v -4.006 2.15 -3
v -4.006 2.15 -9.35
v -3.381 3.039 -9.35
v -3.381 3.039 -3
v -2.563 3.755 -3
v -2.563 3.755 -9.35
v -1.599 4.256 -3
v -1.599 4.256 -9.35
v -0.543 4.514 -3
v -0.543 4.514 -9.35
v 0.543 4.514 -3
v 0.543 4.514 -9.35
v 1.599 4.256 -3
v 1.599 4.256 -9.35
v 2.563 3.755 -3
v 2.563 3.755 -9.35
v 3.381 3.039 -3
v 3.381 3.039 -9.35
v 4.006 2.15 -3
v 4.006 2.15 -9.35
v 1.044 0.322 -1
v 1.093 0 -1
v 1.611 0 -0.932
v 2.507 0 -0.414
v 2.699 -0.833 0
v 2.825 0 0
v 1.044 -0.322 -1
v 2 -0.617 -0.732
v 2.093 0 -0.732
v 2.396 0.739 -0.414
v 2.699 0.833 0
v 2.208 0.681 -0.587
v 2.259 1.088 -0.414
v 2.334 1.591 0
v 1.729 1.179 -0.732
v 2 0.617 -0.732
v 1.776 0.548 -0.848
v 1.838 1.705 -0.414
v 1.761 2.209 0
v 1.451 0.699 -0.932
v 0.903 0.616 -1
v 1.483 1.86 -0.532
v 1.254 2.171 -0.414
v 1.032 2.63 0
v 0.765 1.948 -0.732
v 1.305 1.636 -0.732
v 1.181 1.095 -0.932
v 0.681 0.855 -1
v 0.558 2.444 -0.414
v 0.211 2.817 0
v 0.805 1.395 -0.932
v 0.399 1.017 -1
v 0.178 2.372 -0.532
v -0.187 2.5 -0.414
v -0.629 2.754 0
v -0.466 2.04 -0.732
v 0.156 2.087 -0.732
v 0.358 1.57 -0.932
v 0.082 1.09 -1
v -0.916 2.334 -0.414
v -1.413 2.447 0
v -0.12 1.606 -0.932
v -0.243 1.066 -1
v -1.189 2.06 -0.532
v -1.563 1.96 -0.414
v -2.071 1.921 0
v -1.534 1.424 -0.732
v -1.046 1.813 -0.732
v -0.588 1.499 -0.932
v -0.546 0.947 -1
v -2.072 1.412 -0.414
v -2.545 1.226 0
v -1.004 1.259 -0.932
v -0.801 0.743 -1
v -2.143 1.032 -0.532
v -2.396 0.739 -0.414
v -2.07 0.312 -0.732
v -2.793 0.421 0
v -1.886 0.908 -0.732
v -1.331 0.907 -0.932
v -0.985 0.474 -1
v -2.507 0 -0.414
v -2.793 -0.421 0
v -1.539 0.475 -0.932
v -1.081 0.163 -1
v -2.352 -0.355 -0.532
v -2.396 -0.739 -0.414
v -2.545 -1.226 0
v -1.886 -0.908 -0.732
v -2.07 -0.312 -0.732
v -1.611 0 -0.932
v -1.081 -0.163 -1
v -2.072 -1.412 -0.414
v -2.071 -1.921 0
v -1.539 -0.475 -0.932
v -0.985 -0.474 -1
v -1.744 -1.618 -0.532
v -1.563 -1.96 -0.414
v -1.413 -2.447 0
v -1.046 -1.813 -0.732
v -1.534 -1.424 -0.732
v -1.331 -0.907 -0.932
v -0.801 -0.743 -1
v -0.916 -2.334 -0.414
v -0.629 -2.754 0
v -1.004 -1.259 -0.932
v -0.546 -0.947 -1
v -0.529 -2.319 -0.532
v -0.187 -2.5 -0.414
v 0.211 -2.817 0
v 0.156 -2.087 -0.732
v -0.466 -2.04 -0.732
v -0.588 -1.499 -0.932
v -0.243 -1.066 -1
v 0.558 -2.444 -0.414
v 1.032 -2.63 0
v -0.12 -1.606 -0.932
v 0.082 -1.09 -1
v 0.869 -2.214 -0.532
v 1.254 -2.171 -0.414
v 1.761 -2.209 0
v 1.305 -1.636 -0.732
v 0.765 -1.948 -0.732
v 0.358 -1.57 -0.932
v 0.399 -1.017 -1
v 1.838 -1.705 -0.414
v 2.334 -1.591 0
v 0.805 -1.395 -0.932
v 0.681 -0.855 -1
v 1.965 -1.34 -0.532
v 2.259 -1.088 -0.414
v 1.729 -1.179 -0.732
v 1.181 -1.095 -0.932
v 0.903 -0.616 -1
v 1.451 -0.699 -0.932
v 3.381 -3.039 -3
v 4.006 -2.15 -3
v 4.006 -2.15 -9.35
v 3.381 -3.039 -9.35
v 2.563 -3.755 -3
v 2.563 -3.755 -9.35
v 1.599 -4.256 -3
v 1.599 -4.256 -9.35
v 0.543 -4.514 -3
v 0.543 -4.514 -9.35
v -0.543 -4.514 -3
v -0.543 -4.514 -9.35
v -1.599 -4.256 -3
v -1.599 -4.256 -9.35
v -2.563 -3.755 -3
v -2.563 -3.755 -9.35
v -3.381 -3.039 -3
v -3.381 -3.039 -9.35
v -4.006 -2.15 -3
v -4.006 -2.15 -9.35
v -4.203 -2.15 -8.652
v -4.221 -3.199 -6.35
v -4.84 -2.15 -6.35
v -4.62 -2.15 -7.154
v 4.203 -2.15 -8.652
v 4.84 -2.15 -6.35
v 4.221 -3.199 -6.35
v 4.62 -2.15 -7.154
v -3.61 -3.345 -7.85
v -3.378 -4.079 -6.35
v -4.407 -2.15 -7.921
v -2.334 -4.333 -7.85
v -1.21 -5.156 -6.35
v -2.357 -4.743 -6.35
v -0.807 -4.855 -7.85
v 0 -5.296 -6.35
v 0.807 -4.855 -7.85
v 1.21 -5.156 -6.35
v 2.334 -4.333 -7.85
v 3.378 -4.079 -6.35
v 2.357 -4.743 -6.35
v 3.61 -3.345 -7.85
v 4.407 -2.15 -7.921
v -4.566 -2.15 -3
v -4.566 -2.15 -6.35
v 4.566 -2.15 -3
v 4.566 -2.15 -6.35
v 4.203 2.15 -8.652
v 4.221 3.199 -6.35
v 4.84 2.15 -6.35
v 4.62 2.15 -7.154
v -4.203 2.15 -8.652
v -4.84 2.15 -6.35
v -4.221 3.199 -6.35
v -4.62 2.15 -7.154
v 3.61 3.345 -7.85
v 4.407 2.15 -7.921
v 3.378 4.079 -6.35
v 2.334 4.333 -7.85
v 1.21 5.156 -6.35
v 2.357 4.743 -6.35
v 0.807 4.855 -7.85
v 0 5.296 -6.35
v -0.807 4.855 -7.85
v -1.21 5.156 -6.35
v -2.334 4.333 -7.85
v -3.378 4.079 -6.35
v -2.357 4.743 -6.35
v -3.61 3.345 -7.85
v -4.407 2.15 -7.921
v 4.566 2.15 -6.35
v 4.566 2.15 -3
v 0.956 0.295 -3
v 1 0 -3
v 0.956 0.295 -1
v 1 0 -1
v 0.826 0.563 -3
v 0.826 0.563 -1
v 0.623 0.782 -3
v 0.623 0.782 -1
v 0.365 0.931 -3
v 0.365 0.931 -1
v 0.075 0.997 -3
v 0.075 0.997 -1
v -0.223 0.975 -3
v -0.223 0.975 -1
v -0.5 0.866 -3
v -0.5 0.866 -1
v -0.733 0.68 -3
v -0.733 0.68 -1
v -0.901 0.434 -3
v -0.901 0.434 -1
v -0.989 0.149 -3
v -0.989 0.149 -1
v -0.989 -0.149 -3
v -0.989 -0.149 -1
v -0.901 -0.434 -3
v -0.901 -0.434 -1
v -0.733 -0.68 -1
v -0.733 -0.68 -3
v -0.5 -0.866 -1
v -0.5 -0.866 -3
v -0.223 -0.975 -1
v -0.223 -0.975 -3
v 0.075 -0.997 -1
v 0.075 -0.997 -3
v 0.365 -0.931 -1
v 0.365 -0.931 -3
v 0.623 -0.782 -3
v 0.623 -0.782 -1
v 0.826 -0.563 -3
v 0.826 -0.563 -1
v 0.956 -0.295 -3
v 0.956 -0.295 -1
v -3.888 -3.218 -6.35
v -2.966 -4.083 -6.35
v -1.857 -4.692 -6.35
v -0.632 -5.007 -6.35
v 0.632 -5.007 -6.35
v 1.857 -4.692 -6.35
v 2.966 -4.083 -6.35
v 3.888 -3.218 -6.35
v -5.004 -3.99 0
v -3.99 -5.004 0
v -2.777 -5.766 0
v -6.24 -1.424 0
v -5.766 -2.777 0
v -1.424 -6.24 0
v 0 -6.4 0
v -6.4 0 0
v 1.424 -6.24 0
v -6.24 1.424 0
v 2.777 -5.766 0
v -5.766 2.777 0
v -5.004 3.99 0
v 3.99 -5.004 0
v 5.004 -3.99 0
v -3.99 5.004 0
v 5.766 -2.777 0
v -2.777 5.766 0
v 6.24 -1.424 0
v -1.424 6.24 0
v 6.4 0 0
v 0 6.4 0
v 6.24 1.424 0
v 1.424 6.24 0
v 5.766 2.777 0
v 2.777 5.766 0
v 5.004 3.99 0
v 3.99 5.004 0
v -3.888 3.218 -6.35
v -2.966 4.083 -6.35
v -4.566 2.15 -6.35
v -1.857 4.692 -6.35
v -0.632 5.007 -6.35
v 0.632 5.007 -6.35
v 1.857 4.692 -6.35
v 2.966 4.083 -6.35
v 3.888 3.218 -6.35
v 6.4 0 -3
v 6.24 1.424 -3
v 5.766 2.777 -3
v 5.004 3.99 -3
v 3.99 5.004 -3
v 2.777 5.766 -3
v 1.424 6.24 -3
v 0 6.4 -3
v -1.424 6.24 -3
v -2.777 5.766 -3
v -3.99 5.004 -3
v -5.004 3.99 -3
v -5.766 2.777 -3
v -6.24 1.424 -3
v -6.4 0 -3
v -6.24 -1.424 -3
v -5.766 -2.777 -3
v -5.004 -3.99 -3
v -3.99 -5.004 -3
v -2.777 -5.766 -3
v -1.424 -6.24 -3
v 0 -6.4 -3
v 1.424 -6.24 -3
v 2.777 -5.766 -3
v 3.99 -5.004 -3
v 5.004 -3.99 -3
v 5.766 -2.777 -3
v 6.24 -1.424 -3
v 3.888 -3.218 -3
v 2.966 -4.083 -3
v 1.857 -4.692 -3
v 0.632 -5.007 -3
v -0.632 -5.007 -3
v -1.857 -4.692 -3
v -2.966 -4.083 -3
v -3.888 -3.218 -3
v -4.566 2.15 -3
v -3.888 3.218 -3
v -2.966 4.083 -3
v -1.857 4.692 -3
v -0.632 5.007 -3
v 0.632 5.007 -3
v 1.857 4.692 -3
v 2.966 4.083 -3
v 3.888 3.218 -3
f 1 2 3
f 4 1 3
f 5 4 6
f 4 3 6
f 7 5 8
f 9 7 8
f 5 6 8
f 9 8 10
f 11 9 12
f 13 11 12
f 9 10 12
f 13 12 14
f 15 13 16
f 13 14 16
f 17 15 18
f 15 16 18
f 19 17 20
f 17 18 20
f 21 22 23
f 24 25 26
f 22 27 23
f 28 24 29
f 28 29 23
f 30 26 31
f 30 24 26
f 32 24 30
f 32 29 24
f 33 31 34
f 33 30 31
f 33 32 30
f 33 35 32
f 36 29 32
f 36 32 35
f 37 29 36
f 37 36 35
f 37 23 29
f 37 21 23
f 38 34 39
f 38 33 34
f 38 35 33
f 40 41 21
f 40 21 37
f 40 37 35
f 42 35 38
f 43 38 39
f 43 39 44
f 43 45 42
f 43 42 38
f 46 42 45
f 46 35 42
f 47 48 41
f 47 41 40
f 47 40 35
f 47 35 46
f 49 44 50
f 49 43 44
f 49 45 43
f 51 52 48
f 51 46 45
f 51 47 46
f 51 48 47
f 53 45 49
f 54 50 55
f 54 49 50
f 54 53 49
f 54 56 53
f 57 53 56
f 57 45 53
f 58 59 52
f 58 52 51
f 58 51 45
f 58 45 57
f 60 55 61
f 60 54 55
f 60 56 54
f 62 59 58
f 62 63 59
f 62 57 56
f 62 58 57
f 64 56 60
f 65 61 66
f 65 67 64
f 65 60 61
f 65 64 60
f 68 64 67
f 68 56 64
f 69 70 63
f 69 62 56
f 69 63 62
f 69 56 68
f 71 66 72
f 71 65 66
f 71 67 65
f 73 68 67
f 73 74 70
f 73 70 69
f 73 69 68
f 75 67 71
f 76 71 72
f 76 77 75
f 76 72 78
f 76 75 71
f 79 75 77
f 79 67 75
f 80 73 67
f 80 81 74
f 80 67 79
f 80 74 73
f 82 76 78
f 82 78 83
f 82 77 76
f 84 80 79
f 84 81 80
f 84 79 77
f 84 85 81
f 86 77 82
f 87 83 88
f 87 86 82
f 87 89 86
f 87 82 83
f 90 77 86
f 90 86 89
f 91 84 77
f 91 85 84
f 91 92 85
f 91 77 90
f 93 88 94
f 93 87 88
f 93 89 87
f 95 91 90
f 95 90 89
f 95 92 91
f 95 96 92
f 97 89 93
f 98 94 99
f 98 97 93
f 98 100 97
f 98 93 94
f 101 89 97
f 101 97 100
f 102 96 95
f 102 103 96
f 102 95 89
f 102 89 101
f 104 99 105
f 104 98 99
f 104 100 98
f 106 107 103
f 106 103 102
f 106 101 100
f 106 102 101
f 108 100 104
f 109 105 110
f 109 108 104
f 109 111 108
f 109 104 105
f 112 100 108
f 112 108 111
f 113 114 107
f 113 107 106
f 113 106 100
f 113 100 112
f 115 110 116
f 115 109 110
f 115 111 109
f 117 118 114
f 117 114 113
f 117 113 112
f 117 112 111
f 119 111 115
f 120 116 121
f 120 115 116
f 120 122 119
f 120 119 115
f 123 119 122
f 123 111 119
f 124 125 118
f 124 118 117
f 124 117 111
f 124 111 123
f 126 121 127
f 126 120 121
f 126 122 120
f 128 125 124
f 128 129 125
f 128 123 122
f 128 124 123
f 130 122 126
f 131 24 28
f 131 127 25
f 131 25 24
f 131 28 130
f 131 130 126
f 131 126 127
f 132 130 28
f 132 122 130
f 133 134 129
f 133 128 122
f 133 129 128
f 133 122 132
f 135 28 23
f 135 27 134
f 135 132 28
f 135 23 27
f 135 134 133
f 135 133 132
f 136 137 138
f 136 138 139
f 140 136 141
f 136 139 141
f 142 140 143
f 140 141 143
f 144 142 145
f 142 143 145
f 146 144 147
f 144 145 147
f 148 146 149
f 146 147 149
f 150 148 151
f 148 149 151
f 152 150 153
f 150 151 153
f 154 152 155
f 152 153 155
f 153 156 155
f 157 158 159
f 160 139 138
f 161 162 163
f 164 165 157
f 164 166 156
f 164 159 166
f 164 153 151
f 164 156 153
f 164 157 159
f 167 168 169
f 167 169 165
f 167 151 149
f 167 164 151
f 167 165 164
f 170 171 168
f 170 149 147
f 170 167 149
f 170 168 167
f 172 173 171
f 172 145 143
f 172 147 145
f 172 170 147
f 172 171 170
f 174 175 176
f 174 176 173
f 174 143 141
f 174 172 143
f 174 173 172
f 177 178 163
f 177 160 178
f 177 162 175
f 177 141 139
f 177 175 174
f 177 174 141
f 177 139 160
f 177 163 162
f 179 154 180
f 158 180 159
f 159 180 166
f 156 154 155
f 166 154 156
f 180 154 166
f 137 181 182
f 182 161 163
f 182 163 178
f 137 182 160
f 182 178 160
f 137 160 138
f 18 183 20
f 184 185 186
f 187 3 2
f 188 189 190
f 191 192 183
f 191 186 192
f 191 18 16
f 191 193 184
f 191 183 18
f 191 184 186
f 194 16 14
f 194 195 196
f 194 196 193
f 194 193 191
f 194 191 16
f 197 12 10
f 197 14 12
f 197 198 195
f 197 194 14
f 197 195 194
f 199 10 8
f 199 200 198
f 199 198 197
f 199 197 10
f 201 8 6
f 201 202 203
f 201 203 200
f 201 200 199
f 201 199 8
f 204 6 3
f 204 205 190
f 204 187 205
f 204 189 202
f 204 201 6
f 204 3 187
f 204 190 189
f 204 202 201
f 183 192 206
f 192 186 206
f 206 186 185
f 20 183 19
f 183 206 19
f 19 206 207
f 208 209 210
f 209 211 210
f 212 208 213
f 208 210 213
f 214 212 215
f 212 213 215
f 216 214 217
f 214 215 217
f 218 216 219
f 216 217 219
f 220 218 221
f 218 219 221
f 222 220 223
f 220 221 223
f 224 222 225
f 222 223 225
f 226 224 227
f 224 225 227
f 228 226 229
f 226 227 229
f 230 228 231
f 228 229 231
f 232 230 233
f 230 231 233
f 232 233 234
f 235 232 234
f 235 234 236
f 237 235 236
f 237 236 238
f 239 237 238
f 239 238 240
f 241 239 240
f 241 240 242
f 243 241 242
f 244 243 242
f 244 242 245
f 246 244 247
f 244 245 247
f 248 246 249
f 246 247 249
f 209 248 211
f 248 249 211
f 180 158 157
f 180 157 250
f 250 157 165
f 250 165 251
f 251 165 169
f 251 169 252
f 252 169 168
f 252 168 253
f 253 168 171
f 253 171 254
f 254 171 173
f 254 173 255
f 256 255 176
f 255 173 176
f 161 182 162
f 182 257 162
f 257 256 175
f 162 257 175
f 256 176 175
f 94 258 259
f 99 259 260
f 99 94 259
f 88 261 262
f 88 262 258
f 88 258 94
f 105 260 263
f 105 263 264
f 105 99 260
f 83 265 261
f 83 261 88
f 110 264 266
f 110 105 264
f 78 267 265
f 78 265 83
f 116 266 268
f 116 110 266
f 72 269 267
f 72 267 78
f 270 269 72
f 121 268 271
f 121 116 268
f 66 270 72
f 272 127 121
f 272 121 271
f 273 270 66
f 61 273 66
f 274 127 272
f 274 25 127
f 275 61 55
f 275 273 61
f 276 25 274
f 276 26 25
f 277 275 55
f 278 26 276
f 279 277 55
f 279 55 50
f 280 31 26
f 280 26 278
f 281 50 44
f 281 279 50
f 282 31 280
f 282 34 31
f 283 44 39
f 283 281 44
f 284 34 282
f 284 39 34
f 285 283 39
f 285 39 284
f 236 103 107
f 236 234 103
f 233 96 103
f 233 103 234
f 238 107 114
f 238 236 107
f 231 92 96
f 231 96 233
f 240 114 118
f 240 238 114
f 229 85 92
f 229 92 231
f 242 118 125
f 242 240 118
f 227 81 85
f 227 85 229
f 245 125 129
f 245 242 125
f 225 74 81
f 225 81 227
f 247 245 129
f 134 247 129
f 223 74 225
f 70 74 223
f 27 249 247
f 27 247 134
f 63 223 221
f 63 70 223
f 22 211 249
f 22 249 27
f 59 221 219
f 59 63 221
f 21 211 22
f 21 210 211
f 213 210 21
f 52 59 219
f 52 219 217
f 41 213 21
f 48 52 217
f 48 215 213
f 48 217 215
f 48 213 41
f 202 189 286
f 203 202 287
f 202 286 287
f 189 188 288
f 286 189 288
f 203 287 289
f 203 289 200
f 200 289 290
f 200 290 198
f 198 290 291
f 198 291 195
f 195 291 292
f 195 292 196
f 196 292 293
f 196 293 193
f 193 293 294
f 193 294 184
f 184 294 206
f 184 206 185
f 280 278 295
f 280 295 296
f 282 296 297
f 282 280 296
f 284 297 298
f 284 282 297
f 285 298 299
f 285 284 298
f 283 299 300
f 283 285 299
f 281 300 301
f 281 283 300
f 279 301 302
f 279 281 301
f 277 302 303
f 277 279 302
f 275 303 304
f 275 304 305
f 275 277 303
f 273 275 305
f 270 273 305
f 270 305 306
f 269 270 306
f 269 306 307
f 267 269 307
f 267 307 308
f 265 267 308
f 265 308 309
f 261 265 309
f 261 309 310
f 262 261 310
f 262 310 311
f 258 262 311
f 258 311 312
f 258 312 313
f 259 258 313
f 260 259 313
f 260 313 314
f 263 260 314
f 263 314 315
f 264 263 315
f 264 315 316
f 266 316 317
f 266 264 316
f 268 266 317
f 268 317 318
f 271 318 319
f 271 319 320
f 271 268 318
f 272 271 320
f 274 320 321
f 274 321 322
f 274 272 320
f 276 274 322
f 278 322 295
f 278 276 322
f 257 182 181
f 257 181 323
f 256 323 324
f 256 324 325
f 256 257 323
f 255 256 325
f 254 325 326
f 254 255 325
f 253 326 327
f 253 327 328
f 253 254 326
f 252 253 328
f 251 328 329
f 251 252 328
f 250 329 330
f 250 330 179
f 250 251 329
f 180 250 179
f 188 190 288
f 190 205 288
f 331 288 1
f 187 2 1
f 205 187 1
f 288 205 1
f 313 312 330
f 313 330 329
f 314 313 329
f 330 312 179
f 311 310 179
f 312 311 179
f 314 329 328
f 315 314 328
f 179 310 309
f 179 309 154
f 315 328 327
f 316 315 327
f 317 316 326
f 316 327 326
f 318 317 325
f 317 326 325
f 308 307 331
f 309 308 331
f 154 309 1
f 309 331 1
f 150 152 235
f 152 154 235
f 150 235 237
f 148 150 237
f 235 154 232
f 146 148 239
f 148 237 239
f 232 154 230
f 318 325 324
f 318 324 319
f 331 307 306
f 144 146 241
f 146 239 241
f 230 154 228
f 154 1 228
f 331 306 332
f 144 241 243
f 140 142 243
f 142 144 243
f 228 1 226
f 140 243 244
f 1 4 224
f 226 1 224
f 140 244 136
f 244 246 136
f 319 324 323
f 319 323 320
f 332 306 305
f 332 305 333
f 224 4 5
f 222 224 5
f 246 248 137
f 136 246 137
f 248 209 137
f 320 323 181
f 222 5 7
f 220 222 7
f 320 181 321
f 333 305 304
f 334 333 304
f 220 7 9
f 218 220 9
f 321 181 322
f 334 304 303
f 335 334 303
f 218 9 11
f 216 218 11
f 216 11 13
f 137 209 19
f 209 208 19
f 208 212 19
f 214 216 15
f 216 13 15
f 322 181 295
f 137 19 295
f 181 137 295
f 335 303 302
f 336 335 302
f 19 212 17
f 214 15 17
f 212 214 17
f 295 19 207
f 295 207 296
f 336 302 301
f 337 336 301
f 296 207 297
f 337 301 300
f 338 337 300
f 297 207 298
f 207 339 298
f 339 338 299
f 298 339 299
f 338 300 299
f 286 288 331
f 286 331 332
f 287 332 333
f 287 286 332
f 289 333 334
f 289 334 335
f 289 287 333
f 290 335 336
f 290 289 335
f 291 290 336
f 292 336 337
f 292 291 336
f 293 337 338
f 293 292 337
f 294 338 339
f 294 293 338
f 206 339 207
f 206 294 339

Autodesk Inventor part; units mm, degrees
ref_plane "XZ Plane" through (0, 0, 0) normal (0, 1, 0) x (-1, 0, 0)
ref_plane "XY Plane" through (0, 0, 0) normal (0, 0, 1) x (1, 0, 0)
sketch "Sketch1" plane through (0, 0, 0) normal (0, 0, 1) x (1, 0, 0)
  circle A0 centre (0, 0) radius 6.4
  dimension "d0" = 12.8
sketch "Sketch2" plane through (0, 0, 0) normal (0, 0, 1) x (1, 0, 0)
  circle A0 centre (0, 0) radius 2.825
  dimension "d3" = 5.65
sketch "Sketch3" plane through (0, 0, 0) normal (0, 0, 1) x (1, 0, 0)
  circle A0 centre (0, 0) radius 1
  dimension "d4" = 2
extrude "Extrusion1" add sketch "Sketch1" against normal blind 3
extrude "Extrusion2" cut sketch "Sketch2" against normal blind 1
extrude "Extrusion3" cut sketch "Sketch3" against normal blind 3
fillet "Fillet1" radius 2 1 edges at (-2.825, 0, -1)
sketch "Sketch4" plane through (0, 0, 0) normal (0, 1, 0) x (-1, 0, 0)
  line L0 (-5.0465, -3) -> (-5.0465, -6.35)
  line L1 (-6.4, -3) -> (6.4, -3) projected
  line L2 (-5.2965, -6.35) -> (-4.5465, -9.35)
  line L3 (-5.2965, -6.35) -> (-5.0465, -6.35)
  line L4 (-4.5465, -3) -> (-4.5465, -9.35)
  line L5 (-5.0465, -3) -> (-4.5465, -3)
  line L6 (0, -3) -> (0, -11.7949)
  point P0 (0, 0)
  dimension "d21" = 0.25
  dimension "d26" = 6.35
  dimension "d28" = 0.5
  dimension "d29" = 90
revolve "Revolution2" add sketch "Sketch4" angle 360 about axis through (0, 0, -3) along (0, 0, -1)
ref_plane "Work Plane2" through (6.4, 0, 0) normal (1, 0, 0) x (0, 1, 0)
sketch "Sketch7" plane through (6.4, 0, 0) normal (1, 0, 0) x (0, 1, 0)
  line L0 (-2.15, -3) -> (-2.15, -9.35)
  line L1 (-2.15, -9.35) -> (2.15, -9.35)
  line L2 (2.15, -9.35) -> (2.15, -3)
  line L3 (2.15, -3) -> (-2.15, -3)
  point P0 (0, 0)
  dimension "d34" = 4.3
  dimension "d35" = 6.35
extrude "Extrusion4" cut sketch "Sketch7" against normal blind 12.8
properties part number "Cable end barrel stop"
